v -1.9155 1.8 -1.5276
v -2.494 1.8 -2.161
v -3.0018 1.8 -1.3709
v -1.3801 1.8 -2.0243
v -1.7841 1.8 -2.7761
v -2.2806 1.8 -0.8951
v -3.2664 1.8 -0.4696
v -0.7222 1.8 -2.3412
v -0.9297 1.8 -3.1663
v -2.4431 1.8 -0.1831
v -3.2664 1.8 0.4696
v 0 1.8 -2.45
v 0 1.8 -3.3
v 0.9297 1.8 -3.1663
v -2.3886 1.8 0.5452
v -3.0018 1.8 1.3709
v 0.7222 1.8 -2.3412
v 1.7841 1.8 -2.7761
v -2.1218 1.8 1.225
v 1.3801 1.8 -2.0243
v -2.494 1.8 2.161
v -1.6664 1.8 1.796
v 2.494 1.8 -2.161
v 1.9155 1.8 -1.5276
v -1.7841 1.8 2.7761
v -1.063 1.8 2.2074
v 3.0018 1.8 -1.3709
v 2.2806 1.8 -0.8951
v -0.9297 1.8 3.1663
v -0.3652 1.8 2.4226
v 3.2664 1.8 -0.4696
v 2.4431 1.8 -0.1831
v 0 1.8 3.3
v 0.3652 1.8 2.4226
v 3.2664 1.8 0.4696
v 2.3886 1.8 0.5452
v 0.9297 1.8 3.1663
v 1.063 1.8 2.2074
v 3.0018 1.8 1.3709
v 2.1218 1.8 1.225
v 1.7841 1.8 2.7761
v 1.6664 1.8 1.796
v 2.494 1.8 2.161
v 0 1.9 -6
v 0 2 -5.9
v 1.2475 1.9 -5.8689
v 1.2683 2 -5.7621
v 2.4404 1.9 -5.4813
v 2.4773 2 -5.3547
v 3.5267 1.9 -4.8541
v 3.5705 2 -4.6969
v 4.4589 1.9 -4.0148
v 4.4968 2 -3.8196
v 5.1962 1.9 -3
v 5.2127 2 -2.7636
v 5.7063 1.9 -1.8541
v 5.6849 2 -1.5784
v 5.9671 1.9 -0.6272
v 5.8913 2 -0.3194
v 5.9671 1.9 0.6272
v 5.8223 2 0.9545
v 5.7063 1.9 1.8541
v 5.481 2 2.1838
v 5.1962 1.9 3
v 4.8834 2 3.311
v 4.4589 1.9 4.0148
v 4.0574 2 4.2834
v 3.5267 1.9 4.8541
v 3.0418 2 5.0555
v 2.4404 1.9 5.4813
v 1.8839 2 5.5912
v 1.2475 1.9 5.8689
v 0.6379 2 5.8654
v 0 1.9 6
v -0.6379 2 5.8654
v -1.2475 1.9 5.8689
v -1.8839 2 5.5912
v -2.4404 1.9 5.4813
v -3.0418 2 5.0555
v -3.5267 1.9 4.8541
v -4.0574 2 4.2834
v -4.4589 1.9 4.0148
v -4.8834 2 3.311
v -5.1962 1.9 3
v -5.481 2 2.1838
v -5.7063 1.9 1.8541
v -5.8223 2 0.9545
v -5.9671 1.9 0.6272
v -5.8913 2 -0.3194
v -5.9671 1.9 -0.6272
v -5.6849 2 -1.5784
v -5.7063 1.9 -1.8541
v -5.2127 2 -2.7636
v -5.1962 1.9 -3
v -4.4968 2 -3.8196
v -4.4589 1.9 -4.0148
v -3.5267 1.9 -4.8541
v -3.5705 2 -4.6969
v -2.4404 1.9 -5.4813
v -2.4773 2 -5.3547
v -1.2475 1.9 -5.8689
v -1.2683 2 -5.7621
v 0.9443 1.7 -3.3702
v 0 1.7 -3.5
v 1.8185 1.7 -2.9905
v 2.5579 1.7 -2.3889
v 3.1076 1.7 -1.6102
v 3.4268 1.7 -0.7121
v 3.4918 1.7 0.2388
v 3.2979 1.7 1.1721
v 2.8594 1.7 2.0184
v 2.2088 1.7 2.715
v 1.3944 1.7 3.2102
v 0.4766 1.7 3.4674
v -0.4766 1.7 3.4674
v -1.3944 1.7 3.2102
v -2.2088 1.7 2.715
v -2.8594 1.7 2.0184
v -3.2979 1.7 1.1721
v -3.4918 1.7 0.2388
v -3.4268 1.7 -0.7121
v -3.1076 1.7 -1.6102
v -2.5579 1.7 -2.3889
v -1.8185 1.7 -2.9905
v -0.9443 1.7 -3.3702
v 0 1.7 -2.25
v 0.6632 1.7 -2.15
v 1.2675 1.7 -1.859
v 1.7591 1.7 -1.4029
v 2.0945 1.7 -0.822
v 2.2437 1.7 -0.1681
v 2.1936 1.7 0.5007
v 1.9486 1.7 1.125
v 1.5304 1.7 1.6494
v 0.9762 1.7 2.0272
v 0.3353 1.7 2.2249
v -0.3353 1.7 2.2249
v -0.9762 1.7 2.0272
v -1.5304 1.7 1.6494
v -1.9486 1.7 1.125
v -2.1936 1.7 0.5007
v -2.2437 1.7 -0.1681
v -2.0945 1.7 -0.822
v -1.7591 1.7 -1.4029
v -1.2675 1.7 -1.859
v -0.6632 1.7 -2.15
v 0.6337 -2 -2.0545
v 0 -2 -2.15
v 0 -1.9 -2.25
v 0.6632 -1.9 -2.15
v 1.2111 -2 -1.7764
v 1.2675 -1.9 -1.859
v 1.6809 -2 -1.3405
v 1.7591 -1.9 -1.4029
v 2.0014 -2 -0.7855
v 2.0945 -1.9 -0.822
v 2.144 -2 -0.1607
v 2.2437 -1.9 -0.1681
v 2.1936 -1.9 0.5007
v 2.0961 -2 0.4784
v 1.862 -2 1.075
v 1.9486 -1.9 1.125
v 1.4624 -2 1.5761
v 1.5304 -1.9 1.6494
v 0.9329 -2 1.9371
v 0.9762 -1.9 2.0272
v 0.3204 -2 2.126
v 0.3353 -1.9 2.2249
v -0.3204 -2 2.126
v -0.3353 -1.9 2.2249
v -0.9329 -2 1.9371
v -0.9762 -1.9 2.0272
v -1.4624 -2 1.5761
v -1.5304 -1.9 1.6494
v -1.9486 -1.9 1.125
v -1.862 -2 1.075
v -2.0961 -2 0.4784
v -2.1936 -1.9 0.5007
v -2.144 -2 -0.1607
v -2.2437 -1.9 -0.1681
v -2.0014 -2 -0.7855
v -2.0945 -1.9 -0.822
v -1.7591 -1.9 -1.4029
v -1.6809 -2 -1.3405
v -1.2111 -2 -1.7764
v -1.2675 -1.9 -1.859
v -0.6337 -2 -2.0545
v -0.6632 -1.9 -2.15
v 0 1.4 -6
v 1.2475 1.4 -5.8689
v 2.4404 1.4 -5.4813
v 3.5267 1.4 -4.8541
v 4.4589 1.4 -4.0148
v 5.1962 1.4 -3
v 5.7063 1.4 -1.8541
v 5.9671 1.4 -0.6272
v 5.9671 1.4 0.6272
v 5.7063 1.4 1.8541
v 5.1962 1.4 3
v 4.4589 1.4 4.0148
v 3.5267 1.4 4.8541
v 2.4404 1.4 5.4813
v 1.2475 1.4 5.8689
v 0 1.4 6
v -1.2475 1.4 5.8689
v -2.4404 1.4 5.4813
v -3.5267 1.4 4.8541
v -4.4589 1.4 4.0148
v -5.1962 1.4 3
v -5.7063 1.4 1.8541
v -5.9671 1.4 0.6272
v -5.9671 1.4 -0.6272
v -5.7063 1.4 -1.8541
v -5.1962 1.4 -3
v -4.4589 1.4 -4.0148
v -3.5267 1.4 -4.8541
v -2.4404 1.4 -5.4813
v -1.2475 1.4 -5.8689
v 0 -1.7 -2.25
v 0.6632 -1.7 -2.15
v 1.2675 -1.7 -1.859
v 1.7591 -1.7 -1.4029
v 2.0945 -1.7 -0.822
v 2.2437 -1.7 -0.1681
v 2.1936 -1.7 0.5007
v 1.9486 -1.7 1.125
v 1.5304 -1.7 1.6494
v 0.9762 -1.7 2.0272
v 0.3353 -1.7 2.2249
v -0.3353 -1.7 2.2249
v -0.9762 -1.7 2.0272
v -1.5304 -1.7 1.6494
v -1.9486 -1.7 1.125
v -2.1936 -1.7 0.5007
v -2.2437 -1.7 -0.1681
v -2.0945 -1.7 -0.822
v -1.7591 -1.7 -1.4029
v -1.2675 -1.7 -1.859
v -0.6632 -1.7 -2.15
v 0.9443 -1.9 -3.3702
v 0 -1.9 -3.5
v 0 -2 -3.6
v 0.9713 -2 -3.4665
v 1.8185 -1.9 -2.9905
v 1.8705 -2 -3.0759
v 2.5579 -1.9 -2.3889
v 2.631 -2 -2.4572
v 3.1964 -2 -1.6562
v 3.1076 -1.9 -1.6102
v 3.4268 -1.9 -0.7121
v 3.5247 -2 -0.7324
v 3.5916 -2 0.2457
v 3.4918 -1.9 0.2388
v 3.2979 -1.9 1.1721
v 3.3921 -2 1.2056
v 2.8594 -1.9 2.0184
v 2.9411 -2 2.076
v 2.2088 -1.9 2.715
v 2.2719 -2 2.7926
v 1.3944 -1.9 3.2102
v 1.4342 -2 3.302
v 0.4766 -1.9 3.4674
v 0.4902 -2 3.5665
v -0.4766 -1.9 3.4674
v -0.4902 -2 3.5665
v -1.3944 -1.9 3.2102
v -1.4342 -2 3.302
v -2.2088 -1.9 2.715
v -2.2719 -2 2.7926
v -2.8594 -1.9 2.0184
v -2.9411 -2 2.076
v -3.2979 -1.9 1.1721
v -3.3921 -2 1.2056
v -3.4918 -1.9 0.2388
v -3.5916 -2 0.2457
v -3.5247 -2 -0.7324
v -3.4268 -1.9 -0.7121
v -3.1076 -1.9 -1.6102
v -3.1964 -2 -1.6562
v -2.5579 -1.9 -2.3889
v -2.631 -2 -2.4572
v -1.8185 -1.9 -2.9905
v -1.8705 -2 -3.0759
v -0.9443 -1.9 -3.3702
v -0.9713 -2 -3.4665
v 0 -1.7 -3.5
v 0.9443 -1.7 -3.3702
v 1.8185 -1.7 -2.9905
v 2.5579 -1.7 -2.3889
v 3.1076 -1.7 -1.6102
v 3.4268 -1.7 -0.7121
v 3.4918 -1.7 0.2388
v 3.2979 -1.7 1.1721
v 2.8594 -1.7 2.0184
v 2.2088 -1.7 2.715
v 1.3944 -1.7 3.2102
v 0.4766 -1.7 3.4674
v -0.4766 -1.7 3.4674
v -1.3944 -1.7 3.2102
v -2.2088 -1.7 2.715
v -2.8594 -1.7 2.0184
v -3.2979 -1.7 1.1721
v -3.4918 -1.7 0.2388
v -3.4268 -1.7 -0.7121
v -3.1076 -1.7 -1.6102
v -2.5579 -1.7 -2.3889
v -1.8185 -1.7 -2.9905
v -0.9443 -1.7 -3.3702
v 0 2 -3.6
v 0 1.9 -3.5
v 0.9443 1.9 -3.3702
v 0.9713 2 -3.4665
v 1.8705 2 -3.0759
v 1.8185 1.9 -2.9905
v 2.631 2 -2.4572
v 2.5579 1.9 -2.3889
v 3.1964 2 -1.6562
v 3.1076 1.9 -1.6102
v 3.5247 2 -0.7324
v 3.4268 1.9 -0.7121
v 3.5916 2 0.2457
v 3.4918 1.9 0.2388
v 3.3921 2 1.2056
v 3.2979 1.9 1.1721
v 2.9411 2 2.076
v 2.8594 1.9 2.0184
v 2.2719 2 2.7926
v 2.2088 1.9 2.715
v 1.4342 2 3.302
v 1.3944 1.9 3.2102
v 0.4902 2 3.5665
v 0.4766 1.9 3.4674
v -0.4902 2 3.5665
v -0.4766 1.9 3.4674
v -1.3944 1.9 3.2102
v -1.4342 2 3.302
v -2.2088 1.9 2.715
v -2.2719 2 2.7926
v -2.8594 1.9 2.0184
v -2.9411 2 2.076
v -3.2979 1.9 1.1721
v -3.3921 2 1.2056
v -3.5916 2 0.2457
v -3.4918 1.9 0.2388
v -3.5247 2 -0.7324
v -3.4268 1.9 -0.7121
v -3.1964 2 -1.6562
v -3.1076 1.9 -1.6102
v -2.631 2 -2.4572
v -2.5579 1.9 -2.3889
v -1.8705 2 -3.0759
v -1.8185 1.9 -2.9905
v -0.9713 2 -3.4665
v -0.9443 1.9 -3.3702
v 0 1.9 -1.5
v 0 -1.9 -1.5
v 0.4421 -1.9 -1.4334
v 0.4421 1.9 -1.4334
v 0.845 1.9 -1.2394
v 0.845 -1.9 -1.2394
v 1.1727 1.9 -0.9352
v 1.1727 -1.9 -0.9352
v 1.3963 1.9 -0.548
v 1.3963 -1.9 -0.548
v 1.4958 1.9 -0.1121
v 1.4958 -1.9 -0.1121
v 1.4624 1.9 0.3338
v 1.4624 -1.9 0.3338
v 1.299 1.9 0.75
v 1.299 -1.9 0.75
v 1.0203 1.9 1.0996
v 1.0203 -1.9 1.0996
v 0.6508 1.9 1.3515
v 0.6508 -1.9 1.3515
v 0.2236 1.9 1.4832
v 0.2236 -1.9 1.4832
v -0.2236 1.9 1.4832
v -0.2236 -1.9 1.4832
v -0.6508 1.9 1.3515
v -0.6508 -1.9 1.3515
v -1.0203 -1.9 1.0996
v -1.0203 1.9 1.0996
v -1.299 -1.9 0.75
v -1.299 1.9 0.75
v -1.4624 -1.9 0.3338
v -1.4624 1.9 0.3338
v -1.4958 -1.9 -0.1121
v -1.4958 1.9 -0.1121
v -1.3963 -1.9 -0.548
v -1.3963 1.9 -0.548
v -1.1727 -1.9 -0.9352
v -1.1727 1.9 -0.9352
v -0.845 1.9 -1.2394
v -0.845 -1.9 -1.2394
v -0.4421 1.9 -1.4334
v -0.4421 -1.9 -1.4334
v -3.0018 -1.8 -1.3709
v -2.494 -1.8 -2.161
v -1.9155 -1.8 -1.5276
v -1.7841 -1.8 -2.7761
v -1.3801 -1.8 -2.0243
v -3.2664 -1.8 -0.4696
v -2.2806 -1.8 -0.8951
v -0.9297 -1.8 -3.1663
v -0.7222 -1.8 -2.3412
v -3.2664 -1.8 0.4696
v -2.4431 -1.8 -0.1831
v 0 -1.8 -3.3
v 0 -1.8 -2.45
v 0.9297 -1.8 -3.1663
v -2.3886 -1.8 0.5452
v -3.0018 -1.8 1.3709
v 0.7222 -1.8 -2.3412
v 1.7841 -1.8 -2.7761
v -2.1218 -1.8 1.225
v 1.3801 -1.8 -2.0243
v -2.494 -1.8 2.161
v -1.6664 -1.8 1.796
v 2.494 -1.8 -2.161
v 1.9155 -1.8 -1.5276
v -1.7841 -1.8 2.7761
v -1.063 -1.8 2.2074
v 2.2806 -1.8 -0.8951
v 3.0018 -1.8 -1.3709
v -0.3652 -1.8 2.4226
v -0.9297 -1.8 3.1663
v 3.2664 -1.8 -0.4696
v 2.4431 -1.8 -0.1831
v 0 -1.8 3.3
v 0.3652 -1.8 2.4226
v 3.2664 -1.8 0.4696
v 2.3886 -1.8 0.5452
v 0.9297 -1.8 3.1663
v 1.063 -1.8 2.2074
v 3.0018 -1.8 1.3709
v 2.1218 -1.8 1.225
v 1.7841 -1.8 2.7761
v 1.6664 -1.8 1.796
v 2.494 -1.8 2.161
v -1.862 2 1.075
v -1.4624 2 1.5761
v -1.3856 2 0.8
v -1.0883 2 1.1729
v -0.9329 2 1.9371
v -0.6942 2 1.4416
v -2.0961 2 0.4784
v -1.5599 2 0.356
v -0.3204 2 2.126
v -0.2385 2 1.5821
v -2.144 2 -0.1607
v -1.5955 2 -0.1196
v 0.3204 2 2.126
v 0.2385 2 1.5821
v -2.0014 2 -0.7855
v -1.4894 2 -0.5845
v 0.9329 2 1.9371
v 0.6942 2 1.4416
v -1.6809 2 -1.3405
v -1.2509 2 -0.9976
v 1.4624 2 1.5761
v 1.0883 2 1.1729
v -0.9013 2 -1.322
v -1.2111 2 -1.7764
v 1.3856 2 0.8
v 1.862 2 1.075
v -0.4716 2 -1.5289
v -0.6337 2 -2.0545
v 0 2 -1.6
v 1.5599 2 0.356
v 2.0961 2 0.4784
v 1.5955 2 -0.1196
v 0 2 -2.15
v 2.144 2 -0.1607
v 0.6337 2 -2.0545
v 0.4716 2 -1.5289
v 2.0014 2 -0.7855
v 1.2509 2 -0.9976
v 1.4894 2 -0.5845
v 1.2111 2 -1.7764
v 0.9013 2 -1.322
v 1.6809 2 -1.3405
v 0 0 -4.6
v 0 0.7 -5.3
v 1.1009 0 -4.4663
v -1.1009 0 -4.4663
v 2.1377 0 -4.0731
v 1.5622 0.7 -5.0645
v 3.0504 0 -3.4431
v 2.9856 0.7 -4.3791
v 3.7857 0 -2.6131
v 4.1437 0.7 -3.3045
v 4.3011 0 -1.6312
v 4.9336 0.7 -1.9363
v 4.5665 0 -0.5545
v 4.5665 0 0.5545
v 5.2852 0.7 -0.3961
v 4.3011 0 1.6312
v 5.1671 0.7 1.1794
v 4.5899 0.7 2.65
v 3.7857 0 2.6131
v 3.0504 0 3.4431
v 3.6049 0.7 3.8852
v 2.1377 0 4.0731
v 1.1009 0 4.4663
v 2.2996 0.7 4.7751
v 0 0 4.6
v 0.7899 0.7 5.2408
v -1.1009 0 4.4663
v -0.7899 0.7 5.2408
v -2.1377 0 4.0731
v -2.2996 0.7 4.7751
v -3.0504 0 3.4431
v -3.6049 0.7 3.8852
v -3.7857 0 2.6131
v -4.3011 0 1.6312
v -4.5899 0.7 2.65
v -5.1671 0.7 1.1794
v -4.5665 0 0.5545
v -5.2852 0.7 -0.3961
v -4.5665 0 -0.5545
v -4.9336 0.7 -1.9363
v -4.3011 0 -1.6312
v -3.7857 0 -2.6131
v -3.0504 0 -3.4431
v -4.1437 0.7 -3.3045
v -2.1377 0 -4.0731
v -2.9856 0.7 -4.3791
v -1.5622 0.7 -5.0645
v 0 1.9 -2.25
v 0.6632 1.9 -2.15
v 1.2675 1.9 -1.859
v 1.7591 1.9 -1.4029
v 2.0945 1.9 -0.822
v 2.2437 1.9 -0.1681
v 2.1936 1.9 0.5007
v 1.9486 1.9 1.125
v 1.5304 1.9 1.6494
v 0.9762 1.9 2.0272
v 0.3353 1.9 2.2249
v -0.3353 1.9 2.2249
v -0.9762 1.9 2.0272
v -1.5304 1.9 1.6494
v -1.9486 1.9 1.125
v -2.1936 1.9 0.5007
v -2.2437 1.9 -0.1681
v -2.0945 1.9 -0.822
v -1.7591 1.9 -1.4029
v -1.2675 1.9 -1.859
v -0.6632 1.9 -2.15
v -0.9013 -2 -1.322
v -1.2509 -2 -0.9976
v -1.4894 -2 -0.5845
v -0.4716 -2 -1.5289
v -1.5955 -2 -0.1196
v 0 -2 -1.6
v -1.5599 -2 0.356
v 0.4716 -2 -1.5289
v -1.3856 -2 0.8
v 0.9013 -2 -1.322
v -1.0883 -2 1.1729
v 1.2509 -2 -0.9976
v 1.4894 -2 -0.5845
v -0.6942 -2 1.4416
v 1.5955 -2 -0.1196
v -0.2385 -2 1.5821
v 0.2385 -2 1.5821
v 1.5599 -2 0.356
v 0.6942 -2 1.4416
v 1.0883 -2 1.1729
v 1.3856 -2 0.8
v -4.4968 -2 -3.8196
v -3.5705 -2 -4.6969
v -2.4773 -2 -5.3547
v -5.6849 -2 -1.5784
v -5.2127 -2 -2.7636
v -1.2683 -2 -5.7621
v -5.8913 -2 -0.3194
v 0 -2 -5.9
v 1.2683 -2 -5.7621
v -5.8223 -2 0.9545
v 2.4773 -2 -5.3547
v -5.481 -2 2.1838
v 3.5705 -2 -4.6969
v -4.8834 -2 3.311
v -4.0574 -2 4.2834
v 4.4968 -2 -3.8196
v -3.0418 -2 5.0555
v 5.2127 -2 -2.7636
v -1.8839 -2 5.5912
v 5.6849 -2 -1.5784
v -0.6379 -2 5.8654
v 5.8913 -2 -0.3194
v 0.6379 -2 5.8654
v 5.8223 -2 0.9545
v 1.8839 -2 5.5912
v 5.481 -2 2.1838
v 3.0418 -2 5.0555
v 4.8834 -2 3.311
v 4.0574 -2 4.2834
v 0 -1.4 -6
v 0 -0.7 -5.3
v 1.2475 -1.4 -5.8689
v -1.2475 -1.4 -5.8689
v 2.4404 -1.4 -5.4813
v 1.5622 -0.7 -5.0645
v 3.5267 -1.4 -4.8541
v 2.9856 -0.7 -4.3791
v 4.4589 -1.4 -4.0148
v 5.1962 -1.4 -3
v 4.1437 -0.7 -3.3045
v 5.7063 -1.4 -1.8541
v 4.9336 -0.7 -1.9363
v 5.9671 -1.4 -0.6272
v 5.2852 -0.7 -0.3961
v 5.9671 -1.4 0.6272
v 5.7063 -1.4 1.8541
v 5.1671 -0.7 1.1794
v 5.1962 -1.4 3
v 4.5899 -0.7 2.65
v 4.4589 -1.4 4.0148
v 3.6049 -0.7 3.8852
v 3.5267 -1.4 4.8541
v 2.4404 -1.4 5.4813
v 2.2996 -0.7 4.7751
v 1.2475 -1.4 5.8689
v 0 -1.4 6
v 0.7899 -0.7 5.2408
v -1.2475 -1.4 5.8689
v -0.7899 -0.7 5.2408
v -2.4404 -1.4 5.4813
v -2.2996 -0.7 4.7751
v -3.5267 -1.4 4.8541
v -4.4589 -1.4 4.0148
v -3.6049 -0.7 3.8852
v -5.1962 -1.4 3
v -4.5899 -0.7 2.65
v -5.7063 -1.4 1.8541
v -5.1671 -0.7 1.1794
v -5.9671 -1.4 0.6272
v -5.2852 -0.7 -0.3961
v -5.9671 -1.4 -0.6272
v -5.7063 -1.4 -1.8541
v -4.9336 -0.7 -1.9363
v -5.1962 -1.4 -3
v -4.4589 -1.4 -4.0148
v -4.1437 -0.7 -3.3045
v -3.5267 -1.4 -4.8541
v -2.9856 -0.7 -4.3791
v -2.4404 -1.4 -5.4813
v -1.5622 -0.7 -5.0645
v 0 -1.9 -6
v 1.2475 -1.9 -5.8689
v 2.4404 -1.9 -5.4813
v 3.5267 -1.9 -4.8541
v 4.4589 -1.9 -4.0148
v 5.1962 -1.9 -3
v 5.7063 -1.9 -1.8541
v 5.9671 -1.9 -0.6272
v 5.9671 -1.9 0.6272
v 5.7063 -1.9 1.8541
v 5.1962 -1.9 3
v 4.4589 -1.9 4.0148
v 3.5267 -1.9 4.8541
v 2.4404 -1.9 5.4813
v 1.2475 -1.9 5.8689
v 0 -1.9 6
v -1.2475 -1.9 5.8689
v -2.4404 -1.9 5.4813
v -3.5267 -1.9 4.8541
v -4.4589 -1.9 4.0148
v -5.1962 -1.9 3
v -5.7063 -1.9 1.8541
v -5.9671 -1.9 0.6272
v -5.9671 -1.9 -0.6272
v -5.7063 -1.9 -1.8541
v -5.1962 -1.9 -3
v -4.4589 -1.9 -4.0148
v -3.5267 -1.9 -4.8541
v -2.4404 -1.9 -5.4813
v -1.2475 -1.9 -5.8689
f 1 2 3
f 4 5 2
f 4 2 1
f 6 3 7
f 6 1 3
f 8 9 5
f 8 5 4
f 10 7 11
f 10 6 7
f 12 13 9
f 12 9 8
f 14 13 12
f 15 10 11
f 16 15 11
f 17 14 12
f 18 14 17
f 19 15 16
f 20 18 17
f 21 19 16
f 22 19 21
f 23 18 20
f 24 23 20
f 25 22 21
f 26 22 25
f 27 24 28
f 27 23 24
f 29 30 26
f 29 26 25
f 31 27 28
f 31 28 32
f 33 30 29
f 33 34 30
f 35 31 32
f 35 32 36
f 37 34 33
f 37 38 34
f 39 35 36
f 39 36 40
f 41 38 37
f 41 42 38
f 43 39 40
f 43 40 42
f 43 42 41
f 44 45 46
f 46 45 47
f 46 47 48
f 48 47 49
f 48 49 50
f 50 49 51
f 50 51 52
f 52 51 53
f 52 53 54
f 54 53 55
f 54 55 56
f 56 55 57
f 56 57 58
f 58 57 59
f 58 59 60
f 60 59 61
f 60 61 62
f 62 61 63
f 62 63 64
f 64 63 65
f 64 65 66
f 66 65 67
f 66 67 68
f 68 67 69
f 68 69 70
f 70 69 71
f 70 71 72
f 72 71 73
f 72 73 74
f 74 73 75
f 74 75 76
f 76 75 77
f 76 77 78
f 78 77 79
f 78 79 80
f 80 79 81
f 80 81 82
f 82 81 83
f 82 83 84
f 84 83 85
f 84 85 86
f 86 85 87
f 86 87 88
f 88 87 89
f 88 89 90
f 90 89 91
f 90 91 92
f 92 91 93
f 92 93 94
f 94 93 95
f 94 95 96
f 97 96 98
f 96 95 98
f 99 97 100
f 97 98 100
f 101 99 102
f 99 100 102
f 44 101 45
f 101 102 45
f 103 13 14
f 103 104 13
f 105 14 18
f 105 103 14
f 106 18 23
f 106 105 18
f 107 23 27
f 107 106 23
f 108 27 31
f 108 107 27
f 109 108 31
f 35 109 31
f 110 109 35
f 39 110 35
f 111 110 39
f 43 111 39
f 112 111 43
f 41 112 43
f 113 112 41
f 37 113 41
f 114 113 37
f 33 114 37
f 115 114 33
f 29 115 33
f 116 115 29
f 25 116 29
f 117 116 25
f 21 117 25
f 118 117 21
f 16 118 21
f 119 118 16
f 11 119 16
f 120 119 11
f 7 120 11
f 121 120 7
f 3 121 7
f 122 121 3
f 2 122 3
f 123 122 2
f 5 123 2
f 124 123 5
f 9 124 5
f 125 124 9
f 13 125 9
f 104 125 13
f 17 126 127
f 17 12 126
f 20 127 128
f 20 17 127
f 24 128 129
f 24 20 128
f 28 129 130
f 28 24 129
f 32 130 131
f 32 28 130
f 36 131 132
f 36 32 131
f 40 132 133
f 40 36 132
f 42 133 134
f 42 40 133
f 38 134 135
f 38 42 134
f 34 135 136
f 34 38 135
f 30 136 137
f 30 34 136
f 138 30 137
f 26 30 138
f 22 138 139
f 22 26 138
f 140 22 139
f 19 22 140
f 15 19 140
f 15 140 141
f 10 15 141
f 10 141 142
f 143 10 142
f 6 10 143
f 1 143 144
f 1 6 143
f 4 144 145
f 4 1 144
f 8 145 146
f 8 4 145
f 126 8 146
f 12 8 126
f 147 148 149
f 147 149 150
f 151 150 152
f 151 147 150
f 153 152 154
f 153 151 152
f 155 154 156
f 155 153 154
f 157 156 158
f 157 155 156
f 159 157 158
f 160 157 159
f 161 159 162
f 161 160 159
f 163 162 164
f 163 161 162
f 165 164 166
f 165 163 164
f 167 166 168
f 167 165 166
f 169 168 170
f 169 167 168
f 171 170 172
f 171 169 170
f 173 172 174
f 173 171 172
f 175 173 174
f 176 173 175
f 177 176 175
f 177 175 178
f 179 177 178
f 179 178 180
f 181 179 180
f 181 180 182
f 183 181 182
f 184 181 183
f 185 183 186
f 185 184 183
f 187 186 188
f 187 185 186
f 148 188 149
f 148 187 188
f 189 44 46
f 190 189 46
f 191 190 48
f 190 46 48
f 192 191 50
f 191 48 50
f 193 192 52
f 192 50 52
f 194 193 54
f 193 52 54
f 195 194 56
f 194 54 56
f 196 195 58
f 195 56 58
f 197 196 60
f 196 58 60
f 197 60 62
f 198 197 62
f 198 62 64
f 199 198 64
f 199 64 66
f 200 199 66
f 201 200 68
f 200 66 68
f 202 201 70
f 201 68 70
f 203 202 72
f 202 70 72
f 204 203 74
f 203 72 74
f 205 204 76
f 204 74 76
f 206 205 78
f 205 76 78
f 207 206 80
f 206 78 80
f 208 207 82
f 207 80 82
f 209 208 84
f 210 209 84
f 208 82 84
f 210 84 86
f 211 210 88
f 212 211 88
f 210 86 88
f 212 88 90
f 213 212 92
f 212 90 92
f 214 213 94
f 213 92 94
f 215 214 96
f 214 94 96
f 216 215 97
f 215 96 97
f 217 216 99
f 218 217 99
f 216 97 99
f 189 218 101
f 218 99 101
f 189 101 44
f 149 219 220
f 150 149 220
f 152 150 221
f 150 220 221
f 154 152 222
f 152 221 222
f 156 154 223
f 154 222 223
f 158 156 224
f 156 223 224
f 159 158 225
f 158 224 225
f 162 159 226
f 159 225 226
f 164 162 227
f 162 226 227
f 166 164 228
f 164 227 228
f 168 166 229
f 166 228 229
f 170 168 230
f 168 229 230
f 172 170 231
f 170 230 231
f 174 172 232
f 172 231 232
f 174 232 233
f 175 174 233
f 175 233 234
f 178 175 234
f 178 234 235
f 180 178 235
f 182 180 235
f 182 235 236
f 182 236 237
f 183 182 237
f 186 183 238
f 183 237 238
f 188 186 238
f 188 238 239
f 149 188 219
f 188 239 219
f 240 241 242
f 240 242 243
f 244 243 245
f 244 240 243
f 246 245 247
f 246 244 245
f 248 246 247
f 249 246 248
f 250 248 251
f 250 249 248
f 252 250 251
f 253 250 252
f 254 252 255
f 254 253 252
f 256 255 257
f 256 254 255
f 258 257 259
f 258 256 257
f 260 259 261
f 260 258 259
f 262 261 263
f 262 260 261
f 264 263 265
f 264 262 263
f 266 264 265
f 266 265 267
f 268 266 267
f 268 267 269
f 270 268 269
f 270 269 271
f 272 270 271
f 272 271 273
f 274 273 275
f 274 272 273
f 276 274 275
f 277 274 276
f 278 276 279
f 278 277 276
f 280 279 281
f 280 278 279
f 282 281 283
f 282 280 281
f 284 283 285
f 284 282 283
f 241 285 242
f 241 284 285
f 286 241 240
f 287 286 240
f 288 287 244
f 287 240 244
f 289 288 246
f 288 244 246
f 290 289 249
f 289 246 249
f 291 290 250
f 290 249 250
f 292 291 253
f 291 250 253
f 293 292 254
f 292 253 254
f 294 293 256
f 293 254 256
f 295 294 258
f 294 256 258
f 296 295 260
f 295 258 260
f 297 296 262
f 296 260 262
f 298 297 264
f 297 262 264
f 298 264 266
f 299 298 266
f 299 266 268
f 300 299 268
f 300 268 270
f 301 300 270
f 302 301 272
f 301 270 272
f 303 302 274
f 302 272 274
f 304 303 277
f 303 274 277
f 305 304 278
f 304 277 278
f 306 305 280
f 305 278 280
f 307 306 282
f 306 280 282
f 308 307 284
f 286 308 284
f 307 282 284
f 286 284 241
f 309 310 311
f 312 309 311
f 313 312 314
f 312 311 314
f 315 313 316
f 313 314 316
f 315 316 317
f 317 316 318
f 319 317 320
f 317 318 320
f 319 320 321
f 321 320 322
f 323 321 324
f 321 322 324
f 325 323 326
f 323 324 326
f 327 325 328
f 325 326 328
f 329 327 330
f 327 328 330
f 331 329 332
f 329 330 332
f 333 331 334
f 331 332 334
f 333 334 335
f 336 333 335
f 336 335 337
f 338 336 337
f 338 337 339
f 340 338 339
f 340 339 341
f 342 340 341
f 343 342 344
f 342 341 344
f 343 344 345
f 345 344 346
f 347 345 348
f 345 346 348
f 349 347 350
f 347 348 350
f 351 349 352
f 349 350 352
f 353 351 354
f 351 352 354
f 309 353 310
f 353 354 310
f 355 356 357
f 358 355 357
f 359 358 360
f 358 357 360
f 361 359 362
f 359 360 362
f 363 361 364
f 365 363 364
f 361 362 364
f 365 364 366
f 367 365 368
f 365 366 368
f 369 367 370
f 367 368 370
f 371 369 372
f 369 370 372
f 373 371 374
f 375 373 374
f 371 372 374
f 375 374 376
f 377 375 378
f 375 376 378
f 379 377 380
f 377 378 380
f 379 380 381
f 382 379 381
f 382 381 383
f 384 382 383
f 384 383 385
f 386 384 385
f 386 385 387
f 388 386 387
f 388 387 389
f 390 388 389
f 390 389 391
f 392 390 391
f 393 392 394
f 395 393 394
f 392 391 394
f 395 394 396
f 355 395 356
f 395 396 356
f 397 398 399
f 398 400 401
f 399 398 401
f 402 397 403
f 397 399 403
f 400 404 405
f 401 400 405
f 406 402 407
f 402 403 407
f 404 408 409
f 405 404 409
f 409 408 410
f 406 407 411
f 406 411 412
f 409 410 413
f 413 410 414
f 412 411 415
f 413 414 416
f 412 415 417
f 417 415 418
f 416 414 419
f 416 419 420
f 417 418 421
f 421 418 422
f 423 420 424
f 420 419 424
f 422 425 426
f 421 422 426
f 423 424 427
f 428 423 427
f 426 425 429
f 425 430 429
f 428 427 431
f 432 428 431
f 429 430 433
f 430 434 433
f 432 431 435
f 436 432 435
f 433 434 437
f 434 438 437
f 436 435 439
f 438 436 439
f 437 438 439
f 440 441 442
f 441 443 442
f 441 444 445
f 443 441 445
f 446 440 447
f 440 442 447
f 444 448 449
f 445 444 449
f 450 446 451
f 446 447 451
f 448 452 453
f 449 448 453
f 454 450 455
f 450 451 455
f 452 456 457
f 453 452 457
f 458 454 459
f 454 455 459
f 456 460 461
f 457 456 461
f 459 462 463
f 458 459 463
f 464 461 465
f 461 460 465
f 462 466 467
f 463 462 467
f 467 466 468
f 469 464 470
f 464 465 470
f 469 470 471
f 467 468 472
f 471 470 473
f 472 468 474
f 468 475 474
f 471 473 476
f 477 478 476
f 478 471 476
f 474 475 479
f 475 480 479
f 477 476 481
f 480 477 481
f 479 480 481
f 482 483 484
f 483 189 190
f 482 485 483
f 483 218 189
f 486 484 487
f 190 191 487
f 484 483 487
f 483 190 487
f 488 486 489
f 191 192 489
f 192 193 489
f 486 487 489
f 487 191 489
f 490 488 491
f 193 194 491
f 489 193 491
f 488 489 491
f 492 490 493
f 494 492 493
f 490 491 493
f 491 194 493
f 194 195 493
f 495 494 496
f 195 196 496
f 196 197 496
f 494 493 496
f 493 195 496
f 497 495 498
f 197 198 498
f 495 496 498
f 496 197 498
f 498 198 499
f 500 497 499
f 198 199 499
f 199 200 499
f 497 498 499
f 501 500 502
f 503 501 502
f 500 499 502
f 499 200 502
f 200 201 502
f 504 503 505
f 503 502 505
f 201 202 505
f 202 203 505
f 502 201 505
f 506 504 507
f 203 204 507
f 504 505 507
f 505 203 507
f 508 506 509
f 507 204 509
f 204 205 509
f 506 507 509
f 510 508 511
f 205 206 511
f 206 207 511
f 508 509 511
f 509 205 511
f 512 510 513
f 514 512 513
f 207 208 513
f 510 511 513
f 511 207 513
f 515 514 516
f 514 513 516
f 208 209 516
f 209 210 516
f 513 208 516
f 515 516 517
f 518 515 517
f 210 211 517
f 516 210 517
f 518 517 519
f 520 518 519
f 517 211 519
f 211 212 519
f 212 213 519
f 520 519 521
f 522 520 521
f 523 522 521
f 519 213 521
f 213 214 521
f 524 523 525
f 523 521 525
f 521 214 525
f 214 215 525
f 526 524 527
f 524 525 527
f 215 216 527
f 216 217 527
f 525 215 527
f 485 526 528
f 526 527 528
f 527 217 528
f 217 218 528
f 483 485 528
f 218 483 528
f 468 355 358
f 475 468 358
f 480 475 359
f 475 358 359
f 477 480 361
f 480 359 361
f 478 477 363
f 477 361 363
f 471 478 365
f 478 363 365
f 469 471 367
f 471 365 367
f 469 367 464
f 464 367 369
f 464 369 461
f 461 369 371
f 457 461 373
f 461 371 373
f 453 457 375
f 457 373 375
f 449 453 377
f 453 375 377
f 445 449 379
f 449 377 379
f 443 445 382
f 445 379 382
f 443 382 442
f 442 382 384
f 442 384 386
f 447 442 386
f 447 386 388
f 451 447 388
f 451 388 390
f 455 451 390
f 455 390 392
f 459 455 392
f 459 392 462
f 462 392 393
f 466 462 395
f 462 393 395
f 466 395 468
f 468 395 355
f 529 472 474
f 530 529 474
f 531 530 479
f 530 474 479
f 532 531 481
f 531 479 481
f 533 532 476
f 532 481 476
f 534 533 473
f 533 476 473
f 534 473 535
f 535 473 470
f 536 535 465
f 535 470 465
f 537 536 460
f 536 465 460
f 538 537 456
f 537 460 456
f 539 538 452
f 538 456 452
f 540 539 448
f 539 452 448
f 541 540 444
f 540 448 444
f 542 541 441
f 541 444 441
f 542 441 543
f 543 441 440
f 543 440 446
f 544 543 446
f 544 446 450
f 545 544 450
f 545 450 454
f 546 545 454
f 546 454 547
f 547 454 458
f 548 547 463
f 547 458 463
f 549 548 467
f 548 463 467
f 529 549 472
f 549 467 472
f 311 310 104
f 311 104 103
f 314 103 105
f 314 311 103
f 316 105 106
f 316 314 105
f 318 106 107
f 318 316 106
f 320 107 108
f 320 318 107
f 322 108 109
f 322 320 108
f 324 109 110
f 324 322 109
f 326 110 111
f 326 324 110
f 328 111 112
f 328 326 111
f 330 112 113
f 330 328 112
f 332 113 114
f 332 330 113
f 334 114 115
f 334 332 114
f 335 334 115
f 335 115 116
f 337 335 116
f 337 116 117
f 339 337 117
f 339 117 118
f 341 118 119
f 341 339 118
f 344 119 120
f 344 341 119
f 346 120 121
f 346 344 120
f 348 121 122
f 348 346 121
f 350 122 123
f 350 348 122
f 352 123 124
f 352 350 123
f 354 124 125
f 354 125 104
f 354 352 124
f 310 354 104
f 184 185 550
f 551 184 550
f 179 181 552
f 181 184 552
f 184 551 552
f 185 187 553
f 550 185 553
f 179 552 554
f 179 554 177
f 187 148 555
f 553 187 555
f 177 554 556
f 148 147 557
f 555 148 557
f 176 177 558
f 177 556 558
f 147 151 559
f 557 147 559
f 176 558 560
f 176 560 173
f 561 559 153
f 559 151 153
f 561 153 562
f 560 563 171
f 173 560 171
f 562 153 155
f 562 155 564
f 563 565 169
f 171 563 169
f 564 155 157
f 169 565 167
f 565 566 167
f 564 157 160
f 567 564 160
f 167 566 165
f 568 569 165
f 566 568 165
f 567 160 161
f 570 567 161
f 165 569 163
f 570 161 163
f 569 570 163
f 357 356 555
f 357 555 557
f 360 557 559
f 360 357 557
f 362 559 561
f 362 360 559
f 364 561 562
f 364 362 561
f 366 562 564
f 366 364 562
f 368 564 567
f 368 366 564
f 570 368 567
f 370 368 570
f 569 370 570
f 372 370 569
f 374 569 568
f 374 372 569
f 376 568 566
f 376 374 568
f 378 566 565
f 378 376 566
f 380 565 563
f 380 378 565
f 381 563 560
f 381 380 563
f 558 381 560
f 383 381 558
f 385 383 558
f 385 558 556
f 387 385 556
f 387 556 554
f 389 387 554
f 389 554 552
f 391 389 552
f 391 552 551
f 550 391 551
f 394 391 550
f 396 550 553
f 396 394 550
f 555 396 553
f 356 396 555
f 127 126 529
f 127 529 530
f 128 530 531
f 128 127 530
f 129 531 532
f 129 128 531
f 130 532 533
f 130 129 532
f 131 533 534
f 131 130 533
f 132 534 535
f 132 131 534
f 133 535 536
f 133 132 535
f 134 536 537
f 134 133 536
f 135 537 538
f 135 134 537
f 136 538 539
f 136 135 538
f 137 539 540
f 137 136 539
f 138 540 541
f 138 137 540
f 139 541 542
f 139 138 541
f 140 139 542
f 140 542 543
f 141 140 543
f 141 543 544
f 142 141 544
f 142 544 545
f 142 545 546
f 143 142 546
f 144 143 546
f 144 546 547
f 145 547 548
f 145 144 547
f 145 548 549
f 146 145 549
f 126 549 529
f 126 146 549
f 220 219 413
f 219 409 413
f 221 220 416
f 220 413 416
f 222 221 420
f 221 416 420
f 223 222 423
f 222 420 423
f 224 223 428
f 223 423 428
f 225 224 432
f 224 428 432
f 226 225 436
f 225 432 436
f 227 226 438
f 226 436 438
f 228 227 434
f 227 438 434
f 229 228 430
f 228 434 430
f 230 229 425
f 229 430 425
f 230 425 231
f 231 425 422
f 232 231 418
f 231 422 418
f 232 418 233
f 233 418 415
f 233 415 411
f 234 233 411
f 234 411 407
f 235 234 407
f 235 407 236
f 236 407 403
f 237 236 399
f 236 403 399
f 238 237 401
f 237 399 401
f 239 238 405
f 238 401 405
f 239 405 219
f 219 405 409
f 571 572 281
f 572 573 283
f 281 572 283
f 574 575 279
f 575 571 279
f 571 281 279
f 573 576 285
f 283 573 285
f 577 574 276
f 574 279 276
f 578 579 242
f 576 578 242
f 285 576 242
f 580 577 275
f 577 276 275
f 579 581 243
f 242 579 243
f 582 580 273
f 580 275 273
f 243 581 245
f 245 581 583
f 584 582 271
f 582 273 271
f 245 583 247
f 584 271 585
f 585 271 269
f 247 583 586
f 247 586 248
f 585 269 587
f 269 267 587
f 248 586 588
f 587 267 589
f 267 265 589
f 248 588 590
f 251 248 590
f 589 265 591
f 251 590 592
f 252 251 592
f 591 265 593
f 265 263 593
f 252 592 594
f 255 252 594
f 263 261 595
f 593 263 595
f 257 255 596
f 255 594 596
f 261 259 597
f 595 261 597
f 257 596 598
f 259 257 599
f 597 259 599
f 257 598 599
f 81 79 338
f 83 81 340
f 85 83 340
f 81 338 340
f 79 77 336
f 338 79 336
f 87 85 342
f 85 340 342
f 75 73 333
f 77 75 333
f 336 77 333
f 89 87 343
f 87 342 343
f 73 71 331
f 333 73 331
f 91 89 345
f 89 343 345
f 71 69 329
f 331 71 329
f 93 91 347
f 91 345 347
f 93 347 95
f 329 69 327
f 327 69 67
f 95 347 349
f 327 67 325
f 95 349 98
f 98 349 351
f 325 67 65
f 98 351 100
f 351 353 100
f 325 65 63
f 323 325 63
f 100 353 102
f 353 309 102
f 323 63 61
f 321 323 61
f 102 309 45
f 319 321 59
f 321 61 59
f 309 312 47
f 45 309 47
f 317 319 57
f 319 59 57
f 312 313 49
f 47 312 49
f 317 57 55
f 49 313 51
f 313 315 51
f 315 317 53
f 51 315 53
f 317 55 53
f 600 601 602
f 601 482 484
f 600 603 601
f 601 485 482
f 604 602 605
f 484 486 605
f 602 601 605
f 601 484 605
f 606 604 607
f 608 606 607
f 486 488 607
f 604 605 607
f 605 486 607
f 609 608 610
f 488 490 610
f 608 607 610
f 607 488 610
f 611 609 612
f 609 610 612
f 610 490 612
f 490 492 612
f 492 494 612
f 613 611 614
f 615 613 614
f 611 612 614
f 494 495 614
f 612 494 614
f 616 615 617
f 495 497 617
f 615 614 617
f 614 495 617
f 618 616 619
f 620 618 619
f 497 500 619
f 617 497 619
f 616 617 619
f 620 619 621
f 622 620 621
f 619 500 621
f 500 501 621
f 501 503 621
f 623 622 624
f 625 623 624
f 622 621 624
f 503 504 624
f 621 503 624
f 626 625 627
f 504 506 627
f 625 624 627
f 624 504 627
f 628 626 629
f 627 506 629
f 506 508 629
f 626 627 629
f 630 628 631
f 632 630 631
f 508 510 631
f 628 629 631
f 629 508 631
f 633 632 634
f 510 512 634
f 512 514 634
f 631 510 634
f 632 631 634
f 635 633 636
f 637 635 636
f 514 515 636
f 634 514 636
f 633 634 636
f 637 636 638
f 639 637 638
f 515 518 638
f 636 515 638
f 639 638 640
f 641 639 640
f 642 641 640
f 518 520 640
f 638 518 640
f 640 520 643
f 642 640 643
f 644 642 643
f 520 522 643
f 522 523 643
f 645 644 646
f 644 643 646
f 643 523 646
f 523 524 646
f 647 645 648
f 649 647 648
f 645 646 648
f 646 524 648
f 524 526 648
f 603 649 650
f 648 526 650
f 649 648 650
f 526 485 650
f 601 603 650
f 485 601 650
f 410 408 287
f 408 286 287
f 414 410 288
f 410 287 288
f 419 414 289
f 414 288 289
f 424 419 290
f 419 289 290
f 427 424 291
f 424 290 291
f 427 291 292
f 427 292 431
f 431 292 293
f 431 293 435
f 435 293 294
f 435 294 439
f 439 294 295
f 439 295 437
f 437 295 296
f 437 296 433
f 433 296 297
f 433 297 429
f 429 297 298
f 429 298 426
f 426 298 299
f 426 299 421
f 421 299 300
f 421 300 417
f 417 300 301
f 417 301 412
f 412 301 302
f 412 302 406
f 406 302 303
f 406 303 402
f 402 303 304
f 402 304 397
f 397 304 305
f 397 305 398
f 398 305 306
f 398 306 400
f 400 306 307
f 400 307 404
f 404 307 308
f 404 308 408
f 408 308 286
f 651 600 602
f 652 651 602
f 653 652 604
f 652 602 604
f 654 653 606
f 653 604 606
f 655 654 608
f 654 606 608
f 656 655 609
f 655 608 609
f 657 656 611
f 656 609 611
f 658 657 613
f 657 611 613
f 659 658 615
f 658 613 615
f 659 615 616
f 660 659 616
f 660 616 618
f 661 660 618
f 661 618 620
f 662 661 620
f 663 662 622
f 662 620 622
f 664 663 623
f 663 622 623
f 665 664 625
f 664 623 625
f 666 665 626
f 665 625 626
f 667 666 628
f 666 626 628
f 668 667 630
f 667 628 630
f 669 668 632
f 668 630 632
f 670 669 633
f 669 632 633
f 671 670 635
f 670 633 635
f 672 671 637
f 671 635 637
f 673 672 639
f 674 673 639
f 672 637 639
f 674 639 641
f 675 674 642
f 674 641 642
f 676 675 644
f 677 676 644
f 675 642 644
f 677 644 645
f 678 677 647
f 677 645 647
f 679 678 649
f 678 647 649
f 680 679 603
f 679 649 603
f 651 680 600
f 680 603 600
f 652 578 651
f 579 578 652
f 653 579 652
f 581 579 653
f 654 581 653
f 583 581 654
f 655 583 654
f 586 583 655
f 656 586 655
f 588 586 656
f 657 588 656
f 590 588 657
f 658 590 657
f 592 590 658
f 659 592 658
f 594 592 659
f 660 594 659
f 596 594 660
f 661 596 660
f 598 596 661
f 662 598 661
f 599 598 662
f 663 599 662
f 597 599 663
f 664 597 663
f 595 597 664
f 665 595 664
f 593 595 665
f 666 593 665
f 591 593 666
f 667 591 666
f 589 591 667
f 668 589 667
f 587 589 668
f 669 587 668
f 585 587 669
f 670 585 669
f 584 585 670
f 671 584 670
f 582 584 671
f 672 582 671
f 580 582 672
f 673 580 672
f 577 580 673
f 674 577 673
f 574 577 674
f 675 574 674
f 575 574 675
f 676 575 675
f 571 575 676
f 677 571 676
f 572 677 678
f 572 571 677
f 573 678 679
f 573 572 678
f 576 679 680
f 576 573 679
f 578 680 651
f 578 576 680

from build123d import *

# Parameters (mm, degrees)
CHAMFER1_SIZE = 0.1


with BuildPart() as part:
    # Sketch1 → Revolve1 (revolve)
    with BuildSketch(Plane(origin=(0, 0, 0), x_dir=(0, 0, -1), z_dir=(1, 0, 0))):
        Polygon((4.6, 0), (6, 1.4), (6, 2), (1.5, 2), (1.5, -2), (6, -2), (6, -1.4), align=None)
    revolve(axis=Axis((0, 2, 0), (0, -1, 0)))

    # Sketch3 → Cut-Revolve2 (revolve, cut)
    with BuildSketch(Plane(origin=(0, 0, 0), x_dir=(0, 0, -1), z_dir=(1, 0, 0))):
        Polygon((3.3, 1.8), (3.5, 1.7), (3.5, 2), (2.25, 2), (2.25, 1.7), (2.45, 1.8), align=None)
    cut_revolve2 = revolve(axis=Axis((0, 2, 0), (0, -1, 0)), mode=Mode.SUBTRACT)

    # Mirror1: Cut-Revolve2 across plane
    add(cut_revolve2.mirror(Plane.ZX), mode=Mode.SUBTRACT)

    # Chamfer1
    chamfer1_edges = [part.edges().sort_by_distance(p)[0] for p in [
        (0, 2, 3.5),
        (0, 2, 2.25),
        (0, -2, 3.5),
        (0, -2, 2.25),
        (0, 2, 6),
        (0, -2, 6),
        (0, -2, 1.5),
        (0, 2, 1.5),
    ]]
    chamfer(chamfer1_edges, length=CHAMFER1_SIZE)


solid = part.part
